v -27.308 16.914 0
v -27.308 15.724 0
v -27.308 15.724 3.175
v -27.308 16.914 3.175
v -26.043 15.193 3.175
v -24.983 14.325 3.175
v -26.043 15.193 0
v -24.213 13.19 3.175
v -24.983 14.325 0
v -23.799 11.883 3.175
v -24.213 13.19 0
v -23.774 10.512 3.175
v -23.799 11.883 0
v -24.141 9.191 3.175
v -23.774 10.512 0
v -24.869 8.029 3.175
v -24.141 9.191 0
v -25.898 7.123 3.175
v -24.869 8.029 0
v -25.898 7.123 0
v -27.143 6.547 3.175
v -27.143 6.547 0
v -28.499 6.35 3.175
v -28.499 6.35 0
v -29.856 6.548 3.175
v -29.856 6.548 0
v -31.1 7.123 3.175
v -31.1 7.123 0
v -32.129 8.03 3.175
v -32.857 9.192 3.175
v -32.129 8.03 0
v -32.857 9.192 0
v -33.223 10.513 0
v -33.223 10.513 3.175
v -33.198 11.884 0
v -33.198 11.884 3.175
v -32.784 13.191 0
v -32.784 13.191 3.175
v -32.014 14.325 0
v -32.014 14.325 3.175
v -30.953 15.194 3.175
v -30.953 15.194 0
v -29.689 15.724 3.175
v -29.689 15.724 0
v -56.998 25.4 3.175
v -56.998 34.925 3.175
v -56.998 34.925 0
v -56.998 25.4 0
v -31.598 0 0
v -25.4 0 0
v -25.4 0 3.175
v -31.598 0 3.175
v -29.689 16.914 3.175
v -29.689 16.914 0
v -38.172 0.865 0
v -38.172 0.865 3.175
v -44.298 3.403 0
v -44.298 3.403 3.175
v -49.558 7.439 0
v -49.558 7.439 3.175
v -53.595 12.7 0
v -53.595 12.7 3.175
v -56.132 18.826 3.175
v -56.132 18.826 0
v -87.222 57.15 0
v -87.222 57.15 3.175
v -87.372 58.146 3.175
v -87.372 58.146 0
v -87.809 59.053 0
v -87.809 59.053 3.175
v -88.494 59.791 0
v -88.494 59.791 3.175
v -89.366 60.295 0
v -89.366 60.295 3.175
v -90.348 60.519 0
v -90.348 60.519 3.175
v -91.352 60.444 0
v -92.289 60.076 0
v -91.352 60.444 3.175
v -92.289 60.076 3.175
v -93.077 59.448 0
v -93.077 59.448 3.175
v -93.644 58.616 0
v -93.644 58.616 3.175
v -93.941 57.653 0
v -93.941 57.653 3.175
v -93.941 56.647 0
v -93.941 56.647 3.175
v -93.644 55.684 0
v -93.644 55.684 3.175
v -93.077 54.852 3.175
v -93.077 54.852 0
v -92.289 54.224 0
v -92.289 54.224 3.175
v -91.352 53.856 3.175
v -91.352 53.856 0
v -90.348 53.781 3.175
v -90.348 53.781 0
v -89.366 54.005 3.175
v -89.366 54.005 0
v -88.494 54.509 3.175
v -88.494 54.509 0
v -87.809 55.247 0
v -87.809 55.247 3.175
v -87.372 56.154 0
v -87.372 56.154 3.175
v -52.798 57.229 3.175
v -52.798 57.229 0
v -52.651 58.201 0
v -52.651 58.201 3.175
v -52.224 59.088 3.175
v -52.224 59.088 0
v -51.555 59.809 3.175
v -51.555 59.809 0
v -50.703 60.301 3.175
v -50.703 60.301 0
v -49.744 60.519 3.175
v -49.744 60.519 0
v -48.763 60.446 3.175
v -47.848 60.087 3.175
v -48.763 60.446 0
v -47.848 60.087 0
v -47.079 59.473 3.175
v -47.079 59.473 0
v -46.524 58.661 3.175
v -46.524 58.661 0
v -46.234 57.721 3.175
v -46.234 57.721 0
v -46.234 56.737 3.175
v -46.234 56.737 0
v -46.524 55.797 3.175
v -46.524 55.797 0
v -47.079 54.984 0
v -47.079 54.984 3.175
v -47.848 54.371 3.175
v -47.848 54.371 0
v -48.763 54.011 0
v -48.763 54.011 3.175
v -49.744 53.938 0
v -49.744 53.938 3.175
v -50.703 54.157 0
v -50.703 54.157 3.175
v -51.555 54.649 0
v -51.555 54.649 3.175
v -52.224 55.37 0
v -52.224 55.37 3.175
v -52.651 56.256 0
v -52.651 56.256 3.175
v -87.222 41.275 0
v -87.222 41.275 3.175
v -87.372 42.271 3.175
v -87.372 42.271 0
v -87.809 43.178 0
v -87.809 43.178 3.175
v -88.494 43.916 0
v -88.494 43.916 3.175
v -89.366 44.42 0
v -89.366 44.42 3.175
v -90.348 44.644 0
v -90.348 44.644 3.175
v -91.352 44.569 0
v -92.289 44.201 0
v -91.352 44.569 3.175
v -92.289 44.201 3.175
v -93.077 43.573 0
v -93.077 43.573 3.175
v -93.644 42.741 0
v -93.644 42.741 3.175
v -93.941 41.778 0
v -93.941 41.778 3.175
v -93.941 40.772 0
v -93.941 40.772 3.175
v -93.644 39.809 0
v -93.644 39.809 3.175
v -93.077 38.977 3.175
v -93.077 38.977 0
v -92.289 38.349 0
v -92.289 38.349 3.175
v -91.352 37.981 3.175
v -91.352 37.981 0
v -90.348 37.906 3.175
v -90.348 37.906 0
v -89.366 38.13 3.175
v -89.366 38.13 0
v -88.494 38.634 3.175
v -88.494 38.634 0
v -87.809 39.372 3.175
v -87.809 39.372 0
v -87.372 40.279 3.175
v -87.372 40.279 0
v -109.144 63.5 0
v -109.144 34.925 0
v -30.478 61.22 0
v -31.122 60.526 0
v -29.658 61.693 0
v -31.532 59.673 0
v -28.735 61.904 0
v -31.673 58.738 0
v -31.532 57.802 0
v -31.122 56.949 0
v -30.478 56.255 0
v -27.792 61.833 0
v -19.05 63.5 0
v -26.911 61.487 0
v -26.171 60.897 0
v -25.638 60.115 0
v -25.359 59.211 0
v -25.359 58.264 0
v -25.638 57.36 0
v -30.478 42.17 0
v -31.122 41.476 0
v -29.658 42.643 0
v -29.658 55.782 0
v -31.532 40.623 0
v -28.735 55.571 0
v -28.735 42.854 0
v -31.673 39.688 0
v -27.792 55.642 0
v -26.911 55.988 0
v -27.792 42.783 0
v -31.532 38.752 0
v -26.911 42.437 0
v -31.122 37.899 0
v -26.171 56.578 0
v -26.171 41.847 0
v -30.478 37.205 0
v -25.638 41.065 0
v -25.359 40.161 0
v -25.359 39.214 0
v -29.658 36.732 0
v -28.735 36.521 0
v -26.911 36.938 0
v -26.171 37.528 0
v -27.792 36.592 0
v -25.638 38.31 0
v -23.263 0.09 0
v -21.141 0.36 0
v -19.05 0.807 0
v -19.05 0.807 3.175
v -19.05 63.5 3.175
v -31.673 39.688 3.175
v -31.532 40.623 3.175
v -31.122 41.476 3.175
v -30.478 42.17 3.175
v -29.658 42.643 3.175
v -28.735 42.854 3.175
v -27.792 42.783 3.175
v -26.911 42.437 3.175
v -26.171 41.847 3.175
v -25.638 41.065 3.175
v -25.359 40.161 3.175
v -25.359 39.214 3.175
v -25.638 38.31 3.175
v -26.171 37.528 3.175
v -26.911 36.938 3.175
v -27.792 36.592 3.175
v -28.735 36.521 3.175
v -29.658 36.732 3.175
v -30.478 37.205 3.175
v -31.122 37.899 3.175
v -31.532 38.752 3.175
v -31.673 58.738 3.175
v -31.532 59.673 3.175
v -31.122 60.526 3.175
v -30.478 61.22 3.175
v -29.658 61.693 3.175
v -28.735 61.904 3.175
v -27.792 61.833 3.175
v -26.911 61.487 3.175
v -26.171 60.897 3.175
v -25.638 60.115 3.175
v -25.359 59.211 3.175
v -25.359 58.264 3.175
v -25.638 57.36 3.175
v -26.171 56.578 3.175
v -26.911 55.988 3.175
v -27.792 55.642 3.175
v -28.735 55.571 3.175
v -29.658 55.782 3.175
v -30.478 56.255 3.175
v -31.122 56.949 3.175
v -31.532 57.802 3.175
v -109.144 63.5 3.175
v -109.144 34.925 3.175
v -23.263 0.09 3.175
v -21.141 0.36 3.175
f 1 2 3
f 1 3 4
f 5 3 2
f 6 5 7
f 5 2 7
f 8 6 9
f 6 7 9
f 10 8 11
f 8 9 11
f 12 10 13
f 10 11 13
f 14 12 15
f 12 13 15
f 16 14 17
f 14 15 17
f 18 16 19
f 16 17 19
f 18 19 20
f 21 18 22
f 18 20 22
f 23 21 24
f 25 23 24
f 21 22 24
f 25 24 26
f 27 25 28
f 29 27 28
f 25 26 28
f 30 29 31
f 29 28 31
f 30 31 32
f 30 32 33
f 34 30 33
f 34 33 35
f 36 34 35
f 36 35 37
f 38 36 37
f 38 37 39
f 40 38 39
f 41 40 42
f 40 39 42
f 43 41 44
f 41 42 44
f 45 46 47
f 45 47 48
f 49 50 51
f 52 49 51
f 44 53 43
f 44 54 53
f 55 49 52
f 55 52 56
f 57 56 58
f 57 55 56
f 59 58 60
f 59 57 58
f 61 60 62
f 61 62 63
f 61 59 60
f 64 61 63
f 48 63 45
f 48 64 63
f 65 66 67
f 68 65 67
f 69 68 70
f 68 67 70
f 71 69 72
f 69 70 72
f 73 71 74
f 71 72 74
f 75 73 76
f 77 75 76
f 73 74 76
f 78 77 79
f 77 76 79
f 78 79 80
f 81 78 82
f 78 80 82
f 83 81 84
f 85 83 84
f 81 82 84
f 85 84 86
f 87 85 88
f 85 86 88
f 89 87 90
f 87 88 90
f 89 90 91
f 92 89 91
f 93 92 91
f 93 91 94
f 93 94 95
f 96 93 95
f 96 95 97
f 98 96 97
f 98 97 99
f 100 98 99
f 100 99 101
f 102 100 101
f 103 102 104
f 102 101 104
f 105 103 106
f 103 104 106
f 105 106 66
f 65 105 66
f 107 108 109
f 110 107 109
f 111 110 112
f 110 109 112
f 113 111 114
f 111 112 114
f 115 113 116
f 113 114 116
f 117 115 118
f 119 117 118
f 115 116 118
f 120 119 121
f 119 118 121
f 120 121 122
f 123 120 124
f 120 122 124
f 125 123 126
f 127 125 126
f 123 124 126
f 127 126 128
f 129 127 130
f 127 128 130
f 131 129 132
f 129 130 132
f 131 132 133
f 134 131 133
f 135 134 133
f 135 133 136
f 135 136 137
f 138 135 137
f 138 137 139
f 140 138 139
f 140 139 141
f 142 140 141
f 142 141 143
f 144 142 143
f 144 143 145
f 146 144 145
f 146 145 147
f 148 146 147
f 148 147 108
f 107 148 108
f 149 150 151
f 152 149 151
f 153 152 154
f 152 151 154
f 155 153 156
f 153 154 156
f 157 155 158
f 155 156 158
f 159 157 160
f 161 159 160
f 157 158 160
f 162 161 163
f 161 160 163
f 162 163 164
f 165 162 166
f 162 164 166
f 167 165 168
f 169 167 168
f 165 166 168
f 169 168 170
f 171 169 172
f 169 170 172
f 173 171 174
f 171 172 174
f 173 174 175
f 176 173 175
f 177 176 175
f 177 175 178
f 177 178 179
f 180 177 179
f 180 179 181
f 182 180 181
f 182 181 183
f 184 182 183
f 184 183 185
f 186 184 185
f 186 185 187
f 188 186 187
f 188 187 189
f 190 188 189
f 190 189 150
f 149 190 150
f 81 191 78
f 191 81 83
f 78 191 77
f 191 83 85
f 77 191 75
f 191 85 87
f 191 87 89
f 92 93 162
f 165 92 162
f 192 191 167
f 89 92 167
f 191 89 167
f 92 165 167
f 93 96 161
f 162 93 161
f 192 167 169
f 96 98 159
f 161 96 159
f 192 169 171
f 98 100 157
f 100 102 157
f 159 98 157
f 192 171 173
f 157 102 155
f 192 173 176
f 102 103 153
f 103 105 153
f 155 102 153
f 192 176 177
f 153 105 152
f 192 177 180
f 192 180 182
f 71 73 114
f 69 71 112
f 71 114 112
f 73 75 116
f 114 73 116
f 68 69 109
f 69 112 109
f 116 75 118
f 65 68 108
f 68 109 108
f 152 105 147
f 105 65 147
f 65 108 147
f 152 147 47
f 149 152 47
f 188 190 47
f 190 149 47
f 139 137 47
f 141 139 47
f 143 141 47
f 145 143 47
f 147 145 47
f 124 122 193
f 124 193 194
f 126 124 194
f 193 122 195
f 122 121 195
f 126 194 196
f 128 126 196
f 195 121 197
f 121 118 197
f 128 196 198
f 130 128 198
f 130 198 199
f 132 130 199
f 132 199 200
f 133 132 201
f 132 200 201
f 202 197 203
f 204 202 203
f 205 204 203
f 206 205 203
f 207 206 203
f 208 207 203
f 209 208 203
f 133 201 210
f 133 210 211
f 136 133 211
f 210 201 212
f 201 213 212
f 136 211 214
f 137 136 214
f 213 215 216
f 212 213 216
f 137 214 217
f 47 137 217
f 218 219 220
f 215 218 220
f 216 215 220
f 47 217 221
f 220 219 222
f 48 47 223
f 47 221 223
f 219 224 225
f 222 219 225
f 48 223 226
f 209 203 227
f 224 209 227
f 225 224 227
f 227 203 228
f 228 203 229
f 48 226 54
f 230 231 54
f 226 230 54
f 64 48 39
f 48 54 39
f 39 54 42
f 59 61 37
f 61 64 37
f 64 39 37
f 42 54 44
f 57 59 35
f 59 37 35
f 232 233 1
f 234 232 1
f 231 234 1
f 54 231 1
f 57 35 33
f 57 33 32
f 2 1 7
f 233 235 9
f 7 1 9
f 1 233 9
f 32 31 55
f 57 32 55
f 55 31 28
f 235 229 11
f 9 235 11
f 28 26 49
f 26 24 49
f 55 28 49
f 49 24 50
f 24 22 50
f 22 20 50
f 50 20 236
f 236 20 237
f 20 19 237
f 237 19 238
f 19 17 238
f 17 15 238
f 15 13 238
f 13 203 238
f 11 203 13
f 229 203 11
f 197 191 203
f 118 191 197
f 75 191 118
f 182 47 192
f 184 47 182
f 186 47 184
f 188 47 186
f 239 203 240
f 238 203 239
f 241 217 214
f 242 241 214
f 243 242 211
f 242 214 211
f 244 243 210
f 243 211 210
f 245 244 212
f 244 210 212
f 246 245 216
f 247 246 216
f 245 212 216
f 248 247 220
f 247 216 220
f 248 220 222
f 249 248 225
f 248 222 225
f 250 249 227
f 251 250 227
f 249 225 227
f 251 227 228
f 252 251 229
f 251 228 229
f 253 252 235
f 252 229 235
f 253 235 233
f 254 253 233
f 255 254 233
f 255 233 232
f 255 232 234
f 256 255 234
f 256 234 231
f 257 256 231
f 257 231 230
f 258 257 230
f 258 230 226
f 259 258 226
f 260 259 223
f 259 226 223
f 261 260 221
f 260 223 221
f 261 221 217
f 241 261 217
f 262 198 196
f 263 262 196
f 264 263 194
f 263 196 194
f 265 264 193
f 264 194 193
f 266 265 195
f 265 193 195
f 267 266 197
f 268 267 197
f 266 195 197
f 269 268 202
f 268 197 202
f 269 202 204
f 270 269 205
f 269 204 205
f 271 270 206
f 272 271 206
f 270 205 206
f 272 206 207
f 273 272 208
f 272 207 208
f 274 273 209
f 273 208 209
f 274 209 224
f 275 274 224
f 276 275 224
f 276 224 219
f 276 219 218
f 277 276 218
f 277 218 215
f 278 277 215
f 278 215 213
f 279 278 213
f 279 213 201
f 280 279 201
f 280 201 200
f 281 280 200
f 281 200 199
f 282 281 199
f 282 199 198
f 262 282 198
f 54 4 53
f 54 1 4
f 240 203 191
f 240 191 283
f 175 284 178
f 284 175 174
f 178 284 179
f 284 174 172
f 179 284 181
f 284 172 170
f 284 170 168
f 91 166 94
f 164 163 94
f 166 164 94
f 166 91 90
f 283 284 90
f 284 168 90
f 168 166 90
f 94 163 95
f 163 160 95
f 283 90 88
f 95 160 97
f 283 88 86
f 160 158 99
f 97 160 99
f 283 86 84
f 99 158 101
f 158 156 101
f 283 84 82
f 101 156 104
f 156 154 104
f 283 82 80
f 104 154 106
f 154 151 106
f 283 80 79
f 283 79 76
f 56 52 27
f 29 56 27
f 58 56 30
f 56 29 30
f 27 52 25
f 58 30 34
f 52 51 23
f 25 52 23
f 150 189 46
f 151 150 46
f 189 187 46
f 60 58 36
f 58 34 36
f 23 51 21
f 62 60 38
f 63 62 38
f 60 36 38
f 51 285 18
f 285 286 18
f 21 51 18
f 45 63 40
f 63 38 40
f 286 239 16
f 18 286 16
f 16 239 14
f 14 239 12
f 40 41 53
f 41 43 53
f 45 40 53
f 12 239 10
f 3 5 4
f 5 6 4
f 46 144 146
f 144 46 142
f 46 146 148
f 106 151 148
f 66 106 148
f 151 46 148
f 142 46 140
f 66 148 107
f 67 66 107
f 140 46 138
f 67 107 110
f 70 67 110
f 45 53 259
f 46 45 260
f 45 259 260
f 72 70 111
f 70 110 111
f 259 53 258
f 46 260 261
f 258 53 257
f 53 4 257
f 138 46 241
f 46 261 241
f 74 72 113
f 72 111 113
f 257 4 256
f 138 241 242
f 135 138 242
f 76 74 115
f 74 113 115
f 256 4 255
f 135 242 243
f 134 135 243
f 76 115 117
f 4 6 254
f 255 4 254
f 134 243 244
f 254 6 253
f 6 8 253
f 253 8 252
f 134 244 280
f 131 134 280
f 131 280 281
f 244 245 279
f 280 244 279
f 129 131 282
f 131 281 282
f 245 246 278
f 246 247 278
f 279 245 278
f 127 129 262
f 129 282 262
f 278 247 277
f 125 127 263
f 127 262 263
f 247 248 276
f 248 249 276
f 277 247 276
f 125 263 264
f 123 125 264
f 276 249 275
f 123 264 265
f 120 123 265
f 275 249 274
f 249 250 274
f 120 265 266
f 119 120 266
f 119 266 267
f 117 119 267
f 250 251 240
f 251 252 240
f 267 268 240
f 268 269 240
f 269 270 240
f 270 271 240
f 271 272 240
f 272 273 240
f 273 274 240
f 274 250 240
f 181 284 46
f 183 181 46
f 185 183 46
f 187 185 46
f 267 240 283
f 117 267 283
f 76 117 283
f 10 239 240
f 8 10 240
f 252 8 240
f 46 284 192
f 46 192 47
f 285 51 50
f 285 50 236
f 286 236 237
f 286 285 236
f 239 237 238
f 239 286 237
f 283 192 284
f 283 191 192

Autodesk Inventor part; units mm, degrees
ref_plane "YZ Plane" through (0, 0, 0) normal (1, 0, 0) x (0, 1, 0)
ref_plane "XZ Plane" through (0, 0, 0) normal (0, 1, 0) x (-1, 0, 0)
sketch "Sketch1" plane through (0, 0, 0) normal (0, 0, 1) x (1, 0, 0)
  line L0 (-56.9976, 63.5) -> (0, 63.5)
  line L1 (0, 63.5) -> (-7.493, 63.5)
  line L2 (-7.493, 63.5) -> (-7.493, 57.15)
  line L3 (-56.9976, 63.5) -> (-49.5046, 63.5)
  line L4 (-49.5046, 63.5) -> (-49.5046, 57.15)
  line L5 (-56.9976, 63.5) -> (-56.9976, 0)
  line L6 (-56.9976, 0) -> (0, 0)
  line L7 (0, 0) -> (0, 63.5)
  line L8 (-28.4988, 0) -> (-28.4988, 11.1125)
  circle A0 centre (-28.4988, 11.1125) radius 4.7625
  dimension "d3" = 7.493
  dimension "d4" = 6.35
  dimension "d5" = 7.493
  dimension "d19" = 6.35
  dimension "d60" = 63.5
  dimension "d61" = 11.1125
  dimension "d62" = 9.525
extrude "Plate6" add sketch "Sketch1" along normal blind 3.175
sketch "Sketch6" plane through (0, 0, 0) normal (0, 0, -1) x (-1, 0, 0)
  line L0 (56.9976, 63.5) -> (56.9976, 0) projected
  line L1 (28.4988, 11.1125) -> (27.3076, 11.1125)
  line L2 (28.4988, 11.1125) -> (29.6894, 11.1125)
  circle A0 centre (28.4988, 11.1125) radius 4.7625
  circle A1 centre (28.4988, 11.1125) radius 4.7625 projected
  line L3 (27.3076, 11.1125) -> (29.6888, 11.1125)
  line L4 (29.6888, 11.1125) -> (29.6888, 15.7239)
  line L5 (29.6888, 15.7239) -> (27.3076, 15.7239)
  line L6 (27.3076, 15.7239) -> (27.3076, 11.1125)
  line L7 (27.3076, 15.7239) -> (27.3076, 16.9145)
  line L8 (27.3076, 16.9145) -> (29.6888, 16.9145)
  line L9 (29.6888, 16.9145) -> (29.6888, 15.7239)
  point P0 (27.2012, 15.6948)
  point P1 (30.5454, 15.4129)
  dimension "d82" = 1.1906
  dimension "d86" = 2.3813
  dimension "d87" = 1.1906
extrude "Cut1" cut sketch "Sketch6" against normal blind 3.175 contours L7 L8 L9 A0 | A0 L5
sketch "Sketch7" plane through (-56.9976, 0, 0) normal (-1, 0, 0) x (0, 0, 1)
  line L0 (3.175, 0) -> (3.175, 63.5) projected
  line L1 (0, 63.5) -> (3.175, 63.5) projected
  line L2 (0, 63.5) -> (0, 0) projected
  line L3 (0, 0) -> (3.175, 0) projected
extrude "Extrusion2" add sketch "Sketch7" along normal blind 52.1462
sketch "Sketch8" plane through (0, 0, 3.175) normal (0, 0, 1) x (1, 0, 0)
  line L0 (0, 0) -> (-109.1438, 0) projected
  line L1 (-109.1438, 0) -> (-109.1438, 63.5) projected
  line L2 (-109.1438, 63.5) -> (-109.1438, 34.925)
  line L3 (-109.1438, 34.925) -> (-56.9976, 34.925)
  line L4 (-56.9976, 34.925) -> (-56.9976, 0)
  circle A0 centre (-75.5412, 57.15) radius 3.3782 projected
  circle A1 centre (-75.5412, 41.275) radius 3.3782 projected
  dimension "d71" = 28.575
  dimension "d72" = 52.1462
sketch "Sketch9" plane through (0, 0, 0) normal (0, 0, -1) x (-1, 0, 0)
  circle A0 centre (49.4976, 57.2287) radius 3.3
  circle A1 centre (7.4976, 57.2287) radius 3.3
extrude "Cut3" cut sketch "Sketch9" against normal blind 3.175
extrude "Cut4" cut sketch "Sketch8" against normal blind 3.175 contours L0 L1 L3 L4
sketch "Sketch10" plane through (0, 0, 3.175) normal (0, 0, 1) x (1, 0, 0)
  circle A0 centre (-90.6002, 57.15) radius 3.3782 projected
  circle A1 centre (-90.6002, 41.275) radius 3.3782 projected
extrude "Cut5" cut sketch "Sketch10" against normal blind 3.175
fillet "Fillet1" radius 25.4 2 edges at (-56.9976, 0, 1.5875) (0, 0, 1.5875)
sketch "Sketch11" plane through (0, 0, 3.175) normal (0, 0, 1) x (1, 0, 0)
  circle A0 centre (-90.6002, 57.15) radius 3.3782 projected
  circle A1 centre (-90.6002, 41.275) radius 3.3782 projected
  arc A2 (-25.4, 0) -> (0, 25.4) centre (-25.4, 25.4) ccw projected
  line L0 (0, 63.5) -> (0, 25.4) projected
  line L1 (-109.1438, 63.5) -> (0, 63.5) projected
  line L2 (-109.1438, 34.925) -> (-109.1438, 63.5) projected
  line L3 (-109.1438, 34.925) -> (-56.9976, 34.925) projected
  line L4 (-56.9976, 34.925) -> (-56.9976, 25.4) projected
  arc A3 (-56.9976, 25.4) -> (-31.5976, 0) centre (-31.5976, 25.4) ccw projected
  line L5 (-25.4, 0) -> (-31.5976, 0) projected
  circle A4 centre (-49.4976, 57.2287) radius 3.3 projected
  circle A5 centre (-7.4976, 57.2287) radius 3.3 projected
  line L6 (-29.6888, 15.7239) -> (-29.6888, 16.9145) projected
  line L7 (-29.6888, 16.9145) -> (-27.3076, 16.9145) projected
  line L8 (-27.3076, 16.9145) -> (-27.3076, 15.7239) projected
  line L9 (-27.3076, 15.7239) -> (-27.3088, 15.7239) projected
  arc A6 (-29.6888, 15.7239) -> (-27.3088, 15.7239) centre (-28.4988, 11.1125) ccw projected
  point P0 (0, 0)
ref_plane "Work Plane2" through (-28.4982, 16.9145, 3.175) normal (1, 0, 0) x (0, 0, -1)
sketch "Sketch12" plane through (0, 0, 0) normal (0, 0, -1) x (-1, 0, 0)
  arc A0 (0, 25.4) -> (25.4, 0) centre (25.4, 25.4) ccw projected
  line L0 (0, 63.5) -> (109.1438, 63.5) projected
  line L1 (0, 25.4) -> (0, 63.5) projected
  line L2 (27.3076, 16.9145) -> (29.6888, 16.9145) projected
  circle A1 centre (7.4976, 57.2287) radius 3.3 projected
  circle A2 centre (28.4982, 58.7375) radius 3.175 projected
  circle A3 centre (28.4982, 39.6875) radius 3.175 projected
  line L3 (19.05, 63.5) -> (19.05, 0.8066)
  point P0 (0, 0)
  dimension "d88" = 19.05
extrude "Cut6" cut sketch "Sketch12" against normal blind 3.175
equation "\"d67\" = Thickness"
equation "\"d75\" = Thickness"
equation "\"d77\" = Thickness"
equation "\"d79\" = Thickness"
equation "\"d89\" = Thickness"
equation "\"BendRadius\" = Thickness"
equation "\"BendReliefWidth\" = Thickness"
equation "\"BendReliefDepth\" = 0.5 * Thickness"
equation "\"CornerReliefSize\" = 4 * Thickness"
equation "\"MinimumRemnant\" = 2 * Thickness"
equation "\"TransitionRadius\" = BendRadius"
equation "\"JacobiRadiusSize\" = BendRadius"
equation "\"GapSize\" = Thickness"
equation "\"d8\" = BendRadius"
equation "\"d56\" = BendRadius"
equation "\"d63\" = BendRadius"
equation "\"Thickness\" = 3.175"
properties part number "M - arm mount" material "Steel"
